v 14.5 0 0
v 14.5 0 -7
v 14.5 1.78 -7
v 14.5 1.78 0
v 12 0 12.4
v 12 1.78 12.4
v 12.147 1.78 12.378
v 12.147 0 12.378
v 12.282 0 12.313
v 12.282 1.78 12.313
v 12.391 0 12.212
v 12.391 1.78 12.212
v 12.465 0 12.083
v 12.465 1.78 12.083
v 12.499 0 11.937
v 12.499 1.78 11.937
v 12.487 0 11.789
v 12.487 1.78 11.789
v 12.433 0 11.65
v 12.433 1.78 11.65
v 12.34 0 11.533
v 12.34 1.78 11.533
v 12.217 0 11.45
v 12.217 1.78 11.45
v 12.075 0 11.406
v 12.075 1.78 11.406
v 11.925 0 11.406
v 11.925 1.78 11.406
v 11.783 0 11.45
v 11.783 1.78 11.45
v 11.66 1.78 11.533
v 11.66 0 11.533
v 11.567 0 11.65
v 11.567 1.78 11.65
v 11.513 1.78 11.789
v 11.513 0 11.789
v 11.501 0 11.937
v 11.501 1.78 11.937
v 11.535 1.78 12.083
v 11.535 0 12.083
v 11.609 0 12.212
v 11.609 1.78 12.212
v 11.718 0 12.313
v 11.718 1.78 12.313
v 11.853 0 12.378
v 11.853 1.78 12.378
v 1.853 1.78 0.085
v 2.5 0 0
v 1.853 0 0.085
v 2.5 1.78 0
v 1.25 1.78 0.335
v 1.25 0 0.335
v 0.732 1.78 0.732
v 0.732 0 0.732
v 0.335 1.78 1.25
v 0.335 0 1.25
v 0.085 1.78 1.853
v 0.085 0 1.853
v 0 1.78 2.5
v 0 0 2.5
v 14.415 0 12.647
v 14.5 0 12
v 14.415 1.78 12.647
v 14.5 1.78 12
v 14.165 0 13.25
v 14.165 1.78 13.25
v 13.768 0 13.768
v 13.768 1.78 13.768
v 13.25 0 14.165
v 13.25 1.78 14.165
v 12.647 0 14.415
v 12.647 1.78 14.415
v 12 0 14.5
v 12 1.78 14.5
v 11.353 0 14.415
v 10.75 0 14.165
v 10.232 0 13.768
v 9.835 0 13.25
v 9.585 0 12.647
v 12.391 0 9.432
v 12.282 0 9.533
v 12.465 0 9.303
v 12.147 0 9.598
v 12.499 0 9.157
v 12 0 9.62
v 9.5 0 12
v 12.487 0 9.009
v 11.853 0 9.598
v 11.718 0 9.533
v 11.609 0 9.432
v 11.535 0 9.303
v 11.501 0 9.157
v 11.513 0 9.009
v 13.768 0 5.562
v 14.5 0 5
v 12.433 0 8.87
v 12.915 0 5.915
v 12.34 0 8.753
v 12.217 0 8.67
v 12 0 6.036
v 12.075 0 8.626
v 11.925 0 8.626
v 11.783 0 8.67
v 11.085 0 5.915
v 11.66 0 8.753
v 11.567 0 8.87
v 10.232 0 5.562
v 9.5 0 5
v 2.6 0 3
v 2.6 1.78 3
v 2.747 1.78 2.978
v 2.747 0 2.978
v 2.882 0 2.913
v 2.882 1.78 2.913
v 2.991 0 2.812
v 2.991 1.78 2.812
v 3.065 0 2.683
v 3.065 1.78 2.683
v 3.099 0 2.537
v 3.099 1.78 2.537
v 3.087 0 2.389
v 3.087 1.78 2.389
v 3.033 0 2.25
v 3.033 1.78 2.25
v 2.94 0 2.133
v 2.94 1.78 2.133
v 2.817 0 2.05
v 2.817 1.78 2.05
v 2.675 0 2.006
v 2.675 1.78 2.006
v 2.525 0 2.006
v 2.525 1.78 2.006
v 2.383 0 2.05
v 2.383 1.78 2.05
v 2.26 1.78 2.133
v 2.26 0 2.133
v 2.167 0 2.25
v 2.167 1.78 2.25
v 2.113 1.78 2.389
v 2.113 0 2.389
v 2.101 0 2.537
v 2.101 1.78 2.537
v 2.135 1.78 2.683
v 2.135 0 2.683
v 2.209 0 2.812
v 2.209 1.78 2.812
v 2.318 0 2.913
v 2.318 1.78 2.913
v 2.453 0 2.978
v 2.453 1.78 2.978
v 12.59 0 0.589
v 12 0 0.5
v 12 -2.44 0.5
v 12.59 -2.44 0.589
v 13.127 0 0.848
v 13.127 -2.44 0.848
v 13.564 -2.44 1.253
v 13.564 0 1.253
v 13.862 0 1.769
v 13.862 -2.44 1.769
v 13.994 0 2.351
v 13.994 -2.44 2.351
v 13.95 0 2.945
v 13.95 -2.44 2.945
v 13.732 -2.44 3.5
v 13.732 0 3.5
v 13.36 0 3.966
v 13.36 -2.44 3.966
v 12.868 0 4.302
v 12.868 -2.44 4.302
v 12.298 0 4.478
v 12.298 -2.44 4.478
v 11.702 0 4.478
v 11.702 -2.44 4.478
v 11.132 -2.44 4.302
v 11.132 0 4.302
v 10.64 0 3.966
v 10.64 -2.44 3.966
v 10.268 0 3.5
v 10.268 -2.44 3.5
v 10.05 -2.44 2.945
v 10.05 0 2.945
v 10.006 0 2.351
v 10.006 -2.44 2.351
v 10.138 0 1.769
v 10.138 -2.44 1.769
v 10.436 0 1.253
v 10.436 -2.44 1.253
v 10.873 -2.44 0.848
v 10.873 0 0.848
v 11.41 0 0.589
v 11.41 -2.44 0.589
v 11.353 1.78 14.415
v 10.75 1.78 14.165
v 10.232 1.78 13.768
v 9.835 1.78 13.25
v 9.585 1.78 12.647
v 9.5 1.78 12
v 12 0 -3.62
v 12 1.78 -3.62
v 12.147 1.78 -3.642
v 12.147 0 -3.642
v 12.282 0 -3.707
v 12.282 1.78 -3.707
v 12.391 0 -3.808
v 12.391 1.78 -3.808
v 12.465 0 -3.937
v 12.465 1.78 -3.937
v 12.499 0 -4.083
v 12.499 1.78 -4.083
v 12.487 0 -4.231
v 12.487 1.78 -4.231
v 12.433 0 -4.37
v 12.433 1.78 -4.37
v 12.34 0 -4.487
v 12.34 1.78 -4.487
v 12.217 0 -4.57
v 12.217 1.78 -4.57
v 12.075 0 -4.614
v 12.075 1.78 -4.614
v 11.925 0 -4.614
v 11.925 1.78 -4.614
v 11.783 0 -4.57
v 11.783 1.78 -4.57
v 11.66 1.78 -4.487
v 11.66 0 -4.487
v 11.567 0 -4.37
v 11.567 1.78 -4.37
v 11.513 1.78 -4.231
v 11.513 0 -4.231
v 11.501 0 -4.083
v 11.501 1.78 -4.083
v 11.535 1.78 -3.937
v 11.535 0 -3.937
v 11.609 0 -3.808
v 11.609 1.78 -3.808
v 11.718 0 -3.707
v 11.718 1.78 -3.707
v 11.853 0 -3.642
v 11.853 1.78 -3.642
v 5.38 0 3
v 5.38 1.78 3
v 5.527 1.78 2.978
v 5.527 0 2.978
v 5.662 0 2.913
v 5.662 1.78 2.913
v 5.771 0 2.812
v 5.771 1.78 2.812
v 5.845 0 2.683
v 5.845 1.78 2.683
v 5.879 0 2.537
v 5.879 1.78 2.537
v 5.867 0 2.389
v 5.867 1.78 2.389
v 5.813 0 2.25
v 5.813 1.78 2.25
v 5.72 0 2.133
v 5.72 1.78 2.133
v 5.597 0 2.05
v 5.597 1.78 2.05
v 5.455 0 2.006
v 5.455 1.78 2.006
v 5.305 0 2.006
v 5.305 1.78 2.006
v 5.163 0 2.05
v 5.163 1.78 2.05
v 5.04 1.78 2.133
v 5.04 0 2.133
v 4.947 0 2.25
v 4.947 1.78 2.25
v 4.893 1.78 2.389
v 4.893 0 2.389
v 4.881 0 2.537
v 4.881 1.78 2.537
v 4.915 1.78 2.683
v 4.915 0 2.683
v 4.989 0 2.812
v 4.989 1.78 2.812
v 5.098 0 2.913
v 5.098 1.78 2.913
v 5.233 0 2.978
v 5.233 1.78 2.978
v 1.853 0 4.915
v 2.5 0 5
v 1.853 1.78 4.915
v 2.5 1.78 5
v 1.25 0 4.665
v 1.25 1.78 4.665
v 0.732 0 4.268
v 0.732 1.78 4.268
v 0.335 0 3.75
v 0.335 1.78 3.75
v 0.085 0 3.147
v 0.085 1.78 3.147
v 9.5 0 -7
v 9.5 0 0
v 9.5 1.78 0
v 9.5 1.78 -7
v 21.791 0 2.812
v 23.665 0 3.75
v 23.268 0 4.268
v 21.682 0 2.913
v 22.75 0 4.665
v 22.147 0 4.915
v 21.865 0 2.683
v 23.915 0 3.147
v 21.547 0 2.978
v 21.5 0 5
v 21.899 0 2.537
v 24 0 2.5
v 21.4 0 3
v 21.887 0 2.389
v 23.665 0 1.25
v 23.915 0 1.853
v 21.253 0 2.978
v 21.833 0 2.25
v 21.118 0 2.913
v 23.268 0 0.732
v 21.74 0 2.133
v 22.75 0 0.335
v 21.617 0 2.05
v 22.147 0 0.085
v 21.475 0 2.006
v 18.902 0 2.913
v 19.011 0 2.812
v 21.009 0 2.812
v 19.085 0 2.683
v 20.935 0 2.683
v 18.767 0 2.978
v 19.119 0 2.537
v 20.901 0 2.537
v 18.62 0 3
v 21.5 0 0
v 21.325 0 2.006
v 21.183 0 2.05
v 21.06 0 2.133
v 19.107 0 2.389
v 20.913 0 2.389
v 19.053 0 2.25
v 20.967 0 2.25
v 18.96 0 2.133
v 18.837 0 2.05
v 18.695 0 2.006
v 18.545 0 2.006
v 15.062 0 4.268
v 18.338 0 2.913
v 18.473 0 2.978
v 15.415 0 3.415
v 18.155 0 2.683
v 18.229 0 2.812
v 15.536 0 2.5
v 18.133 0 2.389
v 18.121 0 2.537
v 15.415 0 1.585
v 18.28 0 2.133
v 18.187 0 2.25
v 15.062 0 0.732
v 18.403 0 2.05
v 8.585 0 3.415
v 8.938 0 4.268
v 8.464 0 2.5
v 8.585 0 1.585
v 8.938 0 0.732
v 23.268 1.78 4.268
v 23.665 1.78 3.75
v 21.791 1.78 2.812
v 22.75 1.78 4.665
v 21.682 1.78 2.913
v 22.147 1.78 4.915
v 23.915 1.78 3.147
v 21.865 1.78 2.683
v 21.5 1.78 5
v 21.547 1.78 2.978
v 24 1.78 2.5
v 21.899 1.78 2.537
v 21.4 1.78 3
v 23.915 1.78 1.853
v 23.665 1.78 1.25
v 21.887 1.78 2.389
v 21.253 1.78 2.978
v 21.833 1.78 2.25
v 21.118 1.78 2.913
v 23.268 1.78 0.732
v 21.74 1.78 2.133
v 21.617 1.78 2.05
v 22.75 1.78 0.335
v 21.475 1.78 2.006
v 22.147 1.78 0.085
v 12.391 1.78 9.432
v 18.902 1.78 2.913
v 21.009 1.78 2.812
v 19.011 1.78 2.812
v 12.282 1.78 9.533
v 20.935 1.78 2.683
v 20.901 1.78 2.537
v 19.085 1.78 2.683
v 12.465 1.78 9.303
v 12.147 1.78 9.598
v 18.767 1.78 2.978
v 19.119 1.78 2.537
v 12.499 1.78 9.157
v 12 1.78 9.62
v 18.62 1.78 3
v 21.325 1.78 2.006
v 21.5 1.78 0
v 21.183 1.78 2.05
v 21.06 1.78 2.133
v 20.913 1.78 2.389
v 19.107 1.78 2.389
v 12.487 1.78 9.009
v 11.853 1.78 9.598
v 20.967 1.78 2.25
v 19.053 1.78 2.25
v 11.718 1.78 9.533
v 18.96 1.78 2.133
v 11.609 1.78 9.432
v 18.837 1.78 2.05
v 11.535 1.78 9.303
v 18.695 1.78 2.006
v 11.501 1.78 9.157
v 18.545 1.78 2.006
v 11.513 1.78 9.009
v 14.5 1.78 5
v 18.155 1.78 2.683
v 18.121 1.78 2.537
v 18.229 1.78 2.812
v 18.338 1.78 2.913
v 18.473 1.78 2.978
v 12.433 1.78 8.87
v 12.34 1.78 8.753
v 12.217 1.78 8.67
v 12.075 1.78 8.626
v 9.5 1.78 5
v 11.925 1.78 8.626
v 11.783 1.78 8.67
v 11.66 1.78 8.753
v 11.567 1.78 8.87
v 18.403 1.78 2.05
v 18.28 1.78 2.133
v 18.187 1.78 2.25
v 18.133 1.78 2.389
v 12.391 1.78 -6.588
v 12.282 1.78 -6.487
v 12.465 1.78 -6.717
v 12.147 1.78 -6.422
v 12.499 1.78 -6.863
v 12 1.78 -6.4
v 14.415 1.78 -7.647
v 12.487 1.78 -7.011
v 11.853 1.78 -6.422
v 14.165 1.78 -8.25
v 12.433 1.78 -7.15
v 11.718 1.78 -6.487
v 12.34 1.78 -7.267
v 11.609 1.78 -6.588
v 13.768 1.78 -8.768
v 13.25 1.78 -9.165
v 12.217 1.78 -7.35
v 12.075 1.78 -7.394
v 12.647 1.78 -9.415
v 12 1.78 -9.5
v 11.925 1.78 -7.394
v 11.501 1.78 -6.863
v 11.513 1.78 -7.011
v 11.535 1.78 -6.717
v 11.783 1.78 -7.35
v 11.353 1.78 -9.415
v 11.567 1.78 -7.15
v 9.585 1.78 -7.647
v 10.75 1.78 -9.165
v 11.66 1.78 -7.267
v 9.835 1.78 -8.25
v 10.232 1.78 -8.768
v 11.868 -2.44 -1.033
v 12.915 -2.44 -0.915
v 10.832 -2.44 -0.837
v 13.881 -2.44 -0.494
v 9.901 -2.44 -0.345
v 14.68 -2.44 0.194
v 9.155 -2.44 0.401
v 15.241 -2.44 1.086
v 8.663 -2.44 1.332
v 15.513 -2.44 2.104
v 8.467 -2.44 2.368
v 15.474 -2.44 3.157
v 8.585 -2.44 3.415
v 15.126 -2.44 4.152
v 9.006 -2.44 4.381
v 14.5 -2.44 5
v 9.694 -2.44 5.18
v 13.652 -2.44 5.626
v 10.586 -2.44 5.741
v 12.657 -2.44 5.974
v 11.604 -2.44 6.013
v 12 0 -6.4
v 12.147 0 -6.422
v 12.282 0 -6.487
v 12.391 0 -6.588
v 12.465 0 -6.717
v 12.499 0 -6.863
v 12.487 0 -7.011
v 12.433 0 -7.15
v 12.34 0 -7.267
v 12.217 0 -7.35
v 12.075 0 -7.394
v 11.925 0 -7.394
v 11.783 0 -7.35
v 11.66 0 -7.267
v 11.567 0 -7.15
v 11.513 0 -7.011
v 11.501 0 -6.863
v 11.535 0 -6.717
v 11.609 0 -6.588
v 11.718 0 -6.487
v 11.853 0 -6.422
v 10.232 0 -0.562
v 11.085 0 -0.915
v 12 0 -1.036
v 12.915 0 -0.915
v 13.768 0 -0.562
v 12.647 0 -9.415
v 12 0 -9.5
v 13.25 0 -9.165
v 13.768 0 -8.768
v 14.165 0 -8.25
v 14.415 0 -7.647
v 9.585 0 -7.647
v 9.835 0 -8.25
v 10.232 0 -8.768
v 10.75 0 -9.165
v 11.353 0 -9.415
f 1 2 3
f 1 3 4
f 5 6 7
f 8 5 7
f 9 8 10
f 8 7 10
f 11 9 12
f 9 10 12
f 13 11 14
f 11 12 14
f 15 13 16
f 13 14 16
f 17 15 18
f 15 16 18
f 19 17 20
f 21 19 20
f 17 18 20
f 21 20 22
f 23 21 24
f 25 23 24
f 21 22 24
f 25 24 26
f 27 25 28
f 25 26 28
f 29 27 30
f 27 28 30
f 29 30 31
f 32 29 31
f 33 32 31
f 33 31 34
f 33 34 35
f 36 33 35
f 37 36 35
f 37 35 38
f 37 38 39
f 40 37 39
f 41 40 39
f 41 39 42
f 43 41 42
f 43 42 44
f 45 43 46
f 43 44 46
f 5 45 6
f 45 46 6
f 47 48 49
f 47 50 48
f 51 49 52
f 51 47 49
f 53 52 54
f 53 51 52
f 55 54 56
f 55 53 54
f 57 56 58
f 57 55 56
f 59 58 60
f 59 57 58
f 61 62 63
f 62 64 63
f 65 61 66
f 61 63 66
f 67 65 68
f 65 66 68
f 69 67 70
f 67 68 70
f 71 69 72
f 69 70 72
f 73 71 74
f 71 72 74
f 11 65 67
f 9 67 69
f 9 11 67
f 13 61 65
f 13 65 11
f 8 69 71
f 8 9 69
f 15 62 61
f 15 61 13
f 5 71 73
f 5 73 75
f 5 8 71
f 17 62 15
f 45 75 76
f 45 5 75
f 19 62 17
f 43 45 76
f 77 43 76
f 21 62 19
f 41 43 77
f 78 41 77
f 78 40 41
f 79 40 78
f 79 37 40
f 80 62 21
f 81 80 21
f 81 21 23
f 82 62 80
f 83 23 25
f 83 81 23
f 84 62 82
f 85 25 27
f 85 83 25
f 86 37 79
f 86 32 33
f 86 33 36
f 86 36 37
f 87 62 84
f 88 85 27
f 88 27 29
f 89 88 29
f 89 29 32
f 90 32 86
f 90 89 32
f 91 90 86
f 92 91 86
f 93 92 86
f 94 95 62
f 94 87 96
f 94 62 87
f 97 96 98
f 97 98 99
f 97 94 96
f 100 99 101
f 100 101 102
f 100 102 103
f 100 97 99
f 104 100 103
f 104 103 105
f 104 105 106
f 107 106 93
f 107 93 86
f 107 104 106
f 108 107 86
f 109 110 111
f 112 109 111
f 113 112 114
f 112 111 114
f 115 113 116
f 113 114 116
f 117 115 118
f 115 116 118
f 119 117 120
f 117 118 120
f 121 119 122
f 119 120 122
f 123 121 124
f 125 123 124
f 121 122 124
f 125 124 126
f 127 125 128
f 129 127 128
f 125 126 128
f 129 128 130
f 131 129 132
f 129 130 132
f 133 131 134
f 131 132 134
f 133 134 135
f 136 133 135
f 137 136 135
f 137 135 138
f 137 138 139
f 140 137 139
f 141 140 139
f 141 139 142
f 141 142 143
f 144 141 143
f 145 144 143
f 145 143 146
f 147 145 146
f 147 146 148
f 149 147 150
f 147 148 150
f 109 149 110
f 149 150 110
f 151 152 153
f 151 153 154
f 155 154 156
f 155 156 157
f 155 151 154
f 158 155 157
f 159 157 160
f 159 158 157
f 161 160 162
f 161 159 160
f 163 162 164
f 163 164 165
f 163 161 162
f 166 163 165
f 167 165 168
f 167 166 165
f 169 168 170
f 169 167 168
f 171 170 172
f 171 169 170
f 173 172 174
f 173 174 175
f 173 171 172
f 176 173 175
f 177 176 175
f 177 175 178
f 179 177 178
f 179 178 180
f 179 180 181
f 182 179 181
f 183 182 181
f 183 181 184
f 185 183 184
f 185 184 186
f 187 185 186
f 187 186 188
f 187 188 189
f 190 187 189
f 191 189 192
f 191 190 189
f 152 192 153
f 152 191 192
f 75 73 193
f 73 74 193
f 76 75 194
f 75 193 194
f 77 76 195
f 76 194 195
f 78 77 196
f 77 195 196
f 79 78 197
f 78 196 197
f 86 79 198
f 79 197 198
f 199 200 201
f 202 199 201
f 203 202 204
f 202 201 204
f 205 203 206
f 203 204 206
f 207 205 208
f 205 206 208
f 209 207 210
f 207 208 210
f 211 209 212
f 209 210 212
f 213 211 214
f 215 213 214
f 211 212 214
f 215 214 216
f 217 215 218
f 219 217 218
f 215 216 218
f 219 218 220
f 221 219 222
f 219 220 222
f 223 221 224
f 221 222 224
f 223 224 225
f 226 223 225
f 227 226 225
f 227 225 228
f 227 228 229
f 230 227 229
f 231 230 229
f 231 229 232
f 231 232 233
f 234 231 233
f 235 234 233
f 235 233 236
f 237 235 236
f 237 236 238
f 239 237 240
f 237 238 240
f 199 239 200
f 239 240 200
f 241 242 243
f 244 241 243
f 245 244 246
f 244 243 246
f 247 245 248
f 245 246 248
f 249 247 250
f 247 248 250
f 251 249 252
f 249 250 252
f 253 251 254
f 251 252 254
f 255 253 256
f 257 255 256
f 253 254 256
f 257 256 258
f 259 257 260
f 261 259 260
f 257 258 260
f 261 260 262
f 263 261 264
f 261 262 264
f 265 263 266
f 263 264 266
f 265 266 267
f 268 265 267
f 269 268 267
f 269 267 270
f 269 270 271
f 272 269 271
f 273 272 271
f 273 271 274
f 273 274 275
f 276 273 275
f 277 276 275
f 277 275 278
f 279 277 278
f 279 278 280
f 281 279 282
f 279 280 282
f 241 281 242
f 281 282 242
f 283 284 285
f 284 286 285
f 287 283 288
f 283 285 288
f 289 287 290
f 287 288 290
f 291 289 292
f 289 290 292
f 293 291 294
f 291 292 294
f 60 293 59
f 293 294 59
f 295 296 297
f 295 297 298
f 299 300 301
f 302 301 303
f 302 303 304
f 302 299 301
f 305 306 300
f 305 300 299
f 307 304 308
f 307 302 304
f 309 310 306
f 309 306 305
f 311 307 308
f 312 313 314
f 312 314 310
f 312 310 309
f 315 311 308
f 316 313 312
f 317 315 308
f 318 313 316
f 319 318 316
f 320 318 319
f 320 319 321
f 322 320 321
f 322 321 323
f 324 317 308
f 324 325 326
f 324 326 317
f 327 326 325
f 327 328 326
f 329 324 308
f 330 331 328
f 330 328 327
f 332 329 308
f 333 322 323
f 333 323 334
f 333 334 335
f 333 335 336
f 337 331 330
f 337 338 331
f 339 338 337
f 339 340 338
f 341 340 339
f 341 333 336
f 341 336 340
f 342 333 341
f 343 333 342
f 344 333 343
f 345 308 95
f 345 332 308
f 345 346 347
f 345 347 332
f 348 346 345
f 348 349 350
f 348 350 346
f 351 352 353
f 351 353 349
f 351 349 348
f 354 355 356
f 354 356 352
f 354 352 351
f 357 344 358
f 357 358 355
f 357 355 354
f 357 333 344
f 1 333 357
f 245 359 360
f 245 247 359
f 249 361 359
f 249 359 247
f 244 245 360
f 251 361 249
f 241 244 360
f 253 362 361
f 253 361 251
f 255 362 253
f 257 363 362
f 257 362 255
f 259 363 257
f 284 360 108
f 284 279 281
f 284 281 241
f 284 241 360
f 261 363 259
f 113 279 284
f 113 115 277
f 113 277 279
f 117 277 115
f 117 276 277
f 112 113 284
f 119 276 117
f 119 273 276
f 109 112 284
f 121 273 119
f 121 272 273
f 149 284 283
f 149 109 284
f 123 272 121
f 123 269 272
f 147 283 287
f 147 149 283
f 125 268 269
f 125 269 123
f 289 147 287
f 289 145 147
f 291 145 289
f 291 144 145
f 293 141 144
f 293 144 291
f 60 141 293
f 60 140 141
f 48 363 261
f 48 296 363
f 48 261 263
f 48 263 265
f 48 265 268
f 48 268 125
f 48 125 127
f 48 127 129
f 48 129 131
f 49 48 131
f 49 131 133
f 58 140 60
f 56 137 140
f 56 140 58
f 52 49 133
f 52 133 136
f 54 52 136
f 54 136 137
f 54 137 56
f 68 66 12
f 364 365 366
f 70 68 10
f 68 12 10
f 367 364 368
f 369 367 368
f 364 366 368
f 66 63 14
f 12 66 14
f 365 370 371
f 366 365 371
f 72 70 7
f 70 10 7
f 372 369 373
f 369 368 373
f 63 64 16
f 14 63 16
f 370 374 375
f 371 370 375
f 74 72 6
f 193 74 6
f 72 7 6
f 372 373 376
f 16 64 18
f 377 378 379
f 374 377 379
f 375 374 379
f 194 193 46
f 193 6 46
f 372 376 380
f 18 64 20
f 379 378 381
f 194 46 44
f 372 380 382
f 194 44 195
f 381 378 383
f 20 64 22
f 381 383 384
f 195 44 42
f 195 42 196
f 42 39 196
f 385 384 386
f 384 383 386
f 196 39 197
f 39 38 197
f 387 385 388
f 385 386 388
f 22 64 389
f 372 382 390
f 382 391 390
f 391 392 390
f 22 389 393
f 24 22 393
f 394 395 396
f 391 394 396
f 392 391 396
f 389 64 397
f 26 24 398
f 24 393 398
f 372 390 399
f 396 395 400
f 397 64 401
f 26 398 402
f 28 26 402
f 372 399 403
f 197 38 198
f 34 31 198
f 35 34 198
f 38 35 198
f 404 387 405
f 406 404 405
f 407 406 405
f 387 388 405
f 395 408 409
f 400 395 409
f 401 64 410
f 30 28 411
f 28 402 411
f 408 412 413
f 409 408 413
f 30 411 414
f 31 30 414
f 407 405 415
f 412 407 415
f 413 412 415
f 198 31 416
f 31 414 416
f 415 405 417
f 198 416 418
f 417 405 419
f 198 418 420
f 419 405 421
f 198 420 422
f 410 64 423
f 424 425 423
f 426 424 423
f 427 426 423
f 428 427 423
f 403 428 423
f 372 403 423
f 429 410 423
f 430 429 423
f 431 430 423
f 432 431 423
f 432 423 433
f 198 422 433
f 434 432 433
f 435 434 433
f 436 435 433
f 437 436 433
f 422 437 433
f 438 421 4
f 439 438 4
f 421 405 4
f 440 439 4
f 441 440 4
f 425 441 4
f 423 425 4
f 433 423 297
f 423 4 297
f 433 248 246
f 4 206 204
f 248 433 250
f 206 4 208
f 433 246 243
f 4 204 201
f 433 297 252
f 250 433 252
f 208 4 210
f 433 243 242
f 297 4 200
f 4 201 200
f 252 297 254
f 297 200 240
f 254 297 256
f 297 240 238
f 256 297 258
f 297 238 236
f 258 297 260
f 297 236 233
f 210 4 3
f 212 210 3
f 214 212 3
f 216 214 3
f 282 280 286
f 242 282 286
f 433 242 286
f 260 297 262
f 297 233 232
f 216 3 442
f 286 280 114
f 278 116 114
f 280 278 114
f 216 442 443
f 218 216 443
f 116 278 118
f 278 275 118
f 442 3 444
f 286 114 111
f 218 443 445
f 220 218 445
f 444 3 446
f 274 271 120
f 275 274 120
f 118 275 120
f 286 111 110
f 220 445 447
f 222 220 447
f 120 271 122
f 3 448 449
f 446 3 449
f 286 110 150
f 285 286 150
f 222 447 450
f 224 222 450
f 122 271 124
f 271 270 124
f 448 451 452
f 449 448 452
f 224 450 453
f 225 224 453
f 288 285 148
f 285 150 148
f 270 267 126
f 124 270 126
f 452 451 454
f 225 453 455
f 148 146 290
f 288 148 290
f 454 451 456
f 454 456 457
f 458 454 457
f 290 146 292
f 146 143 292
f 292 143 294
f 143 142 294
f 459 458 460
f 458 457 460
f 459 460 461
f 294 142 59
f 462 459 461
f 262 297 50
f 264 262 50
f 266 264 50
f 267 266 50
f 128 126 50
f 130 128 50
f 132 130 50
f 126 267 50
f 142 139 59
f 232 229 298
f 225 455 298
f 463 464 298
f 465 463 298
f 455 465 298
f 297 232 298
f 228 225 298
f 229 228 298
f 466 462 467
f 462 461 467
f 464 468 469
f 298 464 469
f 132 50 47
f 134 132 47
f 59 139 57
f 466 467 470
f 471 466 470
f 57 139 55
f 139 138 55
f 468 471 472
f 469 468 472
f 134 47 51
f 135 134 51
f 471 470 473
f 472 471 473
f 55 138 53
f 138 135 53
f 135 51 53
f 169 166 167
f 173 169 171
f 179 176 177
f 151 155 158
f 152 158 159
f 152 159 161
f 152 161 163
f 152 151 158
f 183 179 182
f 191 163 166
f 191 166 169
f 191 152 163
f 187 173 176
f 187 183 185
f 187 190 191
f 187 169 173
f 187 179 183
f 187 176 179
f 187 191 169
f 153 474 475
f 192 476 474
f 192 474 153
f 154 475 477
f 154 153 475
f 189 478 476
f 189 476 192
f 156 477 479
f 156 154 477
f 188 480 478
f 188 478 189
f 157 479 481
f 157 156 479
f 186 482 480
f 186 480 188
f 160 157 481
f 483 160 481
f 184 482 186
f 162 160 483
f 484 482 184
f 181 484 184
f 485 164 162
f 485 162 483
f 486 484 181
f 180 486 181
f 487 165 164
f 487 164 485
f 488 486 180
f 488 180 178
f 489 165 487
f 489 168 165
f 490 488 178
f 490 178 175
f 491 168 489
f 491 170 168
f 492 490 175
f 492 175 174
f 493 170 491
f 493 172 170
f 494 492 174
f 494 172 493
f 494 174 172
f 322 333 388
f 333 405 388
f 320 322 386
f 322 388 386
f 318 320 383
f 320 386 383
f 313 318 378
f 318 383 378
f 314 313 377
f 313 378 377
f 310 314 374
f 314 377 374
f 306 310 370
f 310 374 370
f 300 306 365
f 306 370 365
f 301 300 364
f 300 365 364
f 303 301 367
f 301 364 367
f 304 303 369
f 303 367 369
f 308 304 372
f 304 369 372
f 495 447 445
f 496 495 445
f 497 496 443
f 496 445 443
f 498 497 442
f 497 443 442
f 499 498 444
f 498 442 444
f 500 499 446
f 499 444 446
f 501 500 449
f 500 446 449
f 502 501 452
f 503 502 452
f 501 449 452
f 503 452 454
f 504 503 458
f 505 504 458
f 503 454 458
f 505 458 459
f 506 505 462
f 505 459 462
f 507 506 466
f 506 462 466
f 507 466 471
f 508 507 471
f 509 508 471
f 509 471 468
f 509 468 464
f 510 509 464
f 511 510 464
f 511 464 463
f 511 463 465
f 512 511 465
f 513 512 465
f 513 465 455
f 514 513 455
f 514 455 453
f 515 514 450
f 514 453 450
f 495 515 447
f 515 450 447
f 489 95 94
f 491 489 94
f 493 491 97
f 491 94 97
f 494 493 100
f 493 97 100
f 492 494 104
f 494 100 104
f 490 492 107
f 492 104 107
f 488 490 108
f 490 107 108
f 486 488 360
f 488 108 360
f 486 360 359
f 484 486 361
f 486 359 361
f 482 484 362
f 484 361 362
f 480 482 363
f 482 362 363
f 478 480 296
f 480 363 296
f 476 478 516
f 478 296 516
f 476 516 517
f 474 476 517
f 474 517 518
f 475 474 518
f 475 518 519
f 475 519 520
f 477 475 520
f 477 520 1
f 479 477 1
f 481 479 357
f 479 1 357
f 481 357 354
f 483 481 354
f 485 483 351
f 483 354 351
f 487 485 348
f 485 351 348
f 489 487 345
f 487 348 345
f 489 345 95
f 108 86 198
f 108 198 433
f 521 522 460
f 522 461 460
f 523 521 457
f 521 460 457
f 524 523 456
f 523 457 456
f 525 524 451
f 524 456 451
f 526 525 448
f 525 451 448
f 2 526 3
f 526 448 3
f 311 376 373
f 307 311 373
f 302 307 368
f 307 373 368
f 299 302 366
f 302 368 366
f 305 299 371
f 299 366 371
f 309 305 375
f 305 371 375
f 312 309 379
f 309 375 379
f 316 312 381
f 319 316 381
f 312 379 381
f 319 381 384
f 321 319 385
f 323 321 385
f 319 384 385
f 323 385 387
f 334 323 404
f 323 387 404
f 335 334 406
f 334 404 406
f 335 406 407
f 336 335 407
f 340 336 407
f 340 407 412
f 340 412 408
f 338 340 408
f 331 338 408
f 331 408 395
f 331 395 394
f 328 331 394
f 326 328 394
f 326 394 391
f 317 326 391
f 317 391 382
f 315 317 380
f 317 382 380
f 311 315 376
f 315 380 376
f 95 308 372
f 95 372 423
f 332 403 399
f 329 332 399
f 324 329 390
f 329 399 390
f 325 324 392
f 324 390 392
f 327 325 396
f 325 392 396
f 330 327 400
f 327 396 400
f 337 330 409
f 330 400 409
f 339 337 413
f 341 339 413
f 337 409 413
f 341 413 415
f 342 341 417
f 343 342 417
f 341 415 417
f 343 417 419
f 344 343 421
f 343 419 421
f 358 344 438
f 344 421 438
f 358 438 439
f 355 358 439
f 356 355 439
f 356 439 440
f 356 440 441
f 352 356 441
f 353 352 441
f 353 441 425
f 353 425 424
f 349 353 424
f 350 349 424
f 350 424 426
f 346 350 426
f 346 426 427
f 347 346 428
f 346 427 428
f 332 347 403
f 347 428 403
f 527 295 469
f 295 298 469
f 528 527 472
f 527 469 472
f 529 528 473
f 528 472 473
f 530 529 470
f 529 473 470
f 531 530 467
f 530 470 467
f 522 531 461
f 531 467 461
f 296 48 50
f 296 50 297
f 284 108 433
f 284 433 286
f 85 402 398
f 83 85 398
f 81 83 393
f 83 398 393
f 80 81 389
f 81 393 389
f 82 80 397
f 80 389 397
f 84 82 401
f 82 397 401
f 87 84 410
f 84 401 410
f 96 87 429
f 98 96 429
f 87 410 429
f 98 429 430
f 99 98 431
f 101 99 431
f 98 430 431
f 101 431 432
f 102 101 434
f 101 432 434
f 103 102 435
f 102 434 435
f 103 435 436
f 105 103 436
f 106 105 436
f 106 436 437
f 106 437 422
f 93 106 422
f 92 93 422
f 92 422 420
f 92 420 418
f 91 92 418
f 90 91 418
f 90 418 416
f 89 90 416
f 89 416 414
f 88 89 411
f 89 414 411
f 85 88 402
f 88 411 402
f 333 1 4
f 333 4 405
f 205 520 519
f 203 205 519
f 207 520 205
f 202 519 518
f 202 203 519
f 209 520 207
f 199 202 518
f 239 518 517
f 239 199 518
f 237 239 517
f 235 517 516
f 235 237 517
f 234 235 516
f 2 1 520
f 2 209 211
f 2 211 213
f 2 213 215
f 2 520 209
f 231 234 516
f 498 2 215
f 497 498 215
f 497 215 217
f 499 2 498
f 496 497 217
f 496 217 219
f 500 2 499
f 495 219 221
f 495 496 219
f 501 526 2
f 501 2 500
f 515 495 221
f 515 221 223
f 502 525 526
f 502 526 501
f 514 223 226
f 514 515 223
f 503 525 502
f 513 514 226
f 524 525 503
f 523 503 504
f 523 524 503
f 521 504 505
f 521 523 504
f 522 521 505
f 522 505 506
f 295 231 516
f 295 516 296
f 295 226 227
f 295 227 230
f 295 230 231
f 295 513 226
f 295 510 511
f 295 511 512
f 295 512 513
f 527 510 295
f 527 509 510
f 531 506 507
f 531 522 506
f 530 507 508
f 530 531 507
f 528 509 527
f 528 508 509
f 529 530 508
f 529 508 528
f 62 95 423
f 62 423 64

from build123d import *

# Parameters (mm, degrees)
EXTRUDE_1_DEPTH     = 1.78
FILLET_1_R          = 2.5
SKETCH_2_R          = 0.5
CUT_EXTRUDE_2_DEPTH = 1.78
SKETCH_4_R          = 3.535533906
SKETCH_4_R_2        = 2
EXTRUDE_2_DEPTH     = 2.44


with BuildPart() as part:
    # 草图1 → 凸台-拉伸1 (new body)
    with BuildSketch(Plane(origin=(0, 0, 0), x_dir=(1, 0, 0), z_dir=(0, 1, 0))):
        Polygon((0, 0), (9.5, 0), (9.5, 9.5), (14.5, 9.5), (14.5, 0), (24, 0), (24, -5), (14.5, -5), (14.5, -14.5), (9.5, -14.5), (9.5, -5), (0, -5), align=None)
    extrude(amount=EXTRUDE_1_DEPTH)

    # 圆角1
    fillet_1_edges = [part.edges().sort_by_distance(p)[0] for p in [
        (0, 0.89, 5),
        (0, 0.89, 0),
        (9.5, 0.89, -9.5),
        (14.5, 0.89, -9.5),
        (24, 0.89, 0),
        (24, 0.89, 5),
        (9.5, 0.89, 14.5),
        (14.5, 0.89, 14.5),
    ]]
    fillet(fillet_1_edges, radius=FILLET_1_R - 0.0001)  # a hair under: the kernel refuses the full size

    # 草图2 → 切除-拉伸2 (cut)
    with BuildSketch(Plane(origin=(0, 1.78, 0), x_dir=(1, 0, 0), z_dir=(0, 1, 0))):
        with Locations(Location((2.6, -2.5, 0), (0, 0, 270))):
            Circle(SKETCH_2_R)
        with Locations(Location((5.38, -2.5, 0), (0, 0, 270))):
            Circle(SKETCH_2_R)
        with Locations(Location((12, 6.9, 0), (0, 0, 270))):
            Circle(SKETCH_2_R)
        with Locations(Location((12, 4.12, 0), (0, 0, 270))):
            Circle(SKETCH_2_R)
        with Locations(Location((21.4, -2.5, 0), (0, 0, 270))):
            Circle(SKETCH_2_R)
        with Locations(Location((18.62, -2.5, 0), (0, 0, 270))):
            Circle(SKETCH_2_R)
        with Locations(Location((12, -11.9, 0), (0, 0, 270))):
            Circle(SKETCH_2_R)
        with Locations(Location((12, -9.12, 0), (0, 0, 270))):
            Circle(SKETCH_2_R)
    extrude(amount=-CUT_EXTRUDE_2_DEPTH, mode=Mode.SUBTRACT)

    # 草图4 → 凸台-拉伸2 (add)
    with BuildSketch(Plane.XZ):
        with Locations(Location((12, 2.5, 0), (0, 0, 45))):
            Circle(SKETCH_4_R)
        with Locations(Location((12, 2.5, 0), (0, 0, 270))):
            Circle(SKETCH_4_R_2, mode=Mode.SUBTRACT)
    extrude(amount=EXTRUDE_2_DEPTH)


solid = part.part
